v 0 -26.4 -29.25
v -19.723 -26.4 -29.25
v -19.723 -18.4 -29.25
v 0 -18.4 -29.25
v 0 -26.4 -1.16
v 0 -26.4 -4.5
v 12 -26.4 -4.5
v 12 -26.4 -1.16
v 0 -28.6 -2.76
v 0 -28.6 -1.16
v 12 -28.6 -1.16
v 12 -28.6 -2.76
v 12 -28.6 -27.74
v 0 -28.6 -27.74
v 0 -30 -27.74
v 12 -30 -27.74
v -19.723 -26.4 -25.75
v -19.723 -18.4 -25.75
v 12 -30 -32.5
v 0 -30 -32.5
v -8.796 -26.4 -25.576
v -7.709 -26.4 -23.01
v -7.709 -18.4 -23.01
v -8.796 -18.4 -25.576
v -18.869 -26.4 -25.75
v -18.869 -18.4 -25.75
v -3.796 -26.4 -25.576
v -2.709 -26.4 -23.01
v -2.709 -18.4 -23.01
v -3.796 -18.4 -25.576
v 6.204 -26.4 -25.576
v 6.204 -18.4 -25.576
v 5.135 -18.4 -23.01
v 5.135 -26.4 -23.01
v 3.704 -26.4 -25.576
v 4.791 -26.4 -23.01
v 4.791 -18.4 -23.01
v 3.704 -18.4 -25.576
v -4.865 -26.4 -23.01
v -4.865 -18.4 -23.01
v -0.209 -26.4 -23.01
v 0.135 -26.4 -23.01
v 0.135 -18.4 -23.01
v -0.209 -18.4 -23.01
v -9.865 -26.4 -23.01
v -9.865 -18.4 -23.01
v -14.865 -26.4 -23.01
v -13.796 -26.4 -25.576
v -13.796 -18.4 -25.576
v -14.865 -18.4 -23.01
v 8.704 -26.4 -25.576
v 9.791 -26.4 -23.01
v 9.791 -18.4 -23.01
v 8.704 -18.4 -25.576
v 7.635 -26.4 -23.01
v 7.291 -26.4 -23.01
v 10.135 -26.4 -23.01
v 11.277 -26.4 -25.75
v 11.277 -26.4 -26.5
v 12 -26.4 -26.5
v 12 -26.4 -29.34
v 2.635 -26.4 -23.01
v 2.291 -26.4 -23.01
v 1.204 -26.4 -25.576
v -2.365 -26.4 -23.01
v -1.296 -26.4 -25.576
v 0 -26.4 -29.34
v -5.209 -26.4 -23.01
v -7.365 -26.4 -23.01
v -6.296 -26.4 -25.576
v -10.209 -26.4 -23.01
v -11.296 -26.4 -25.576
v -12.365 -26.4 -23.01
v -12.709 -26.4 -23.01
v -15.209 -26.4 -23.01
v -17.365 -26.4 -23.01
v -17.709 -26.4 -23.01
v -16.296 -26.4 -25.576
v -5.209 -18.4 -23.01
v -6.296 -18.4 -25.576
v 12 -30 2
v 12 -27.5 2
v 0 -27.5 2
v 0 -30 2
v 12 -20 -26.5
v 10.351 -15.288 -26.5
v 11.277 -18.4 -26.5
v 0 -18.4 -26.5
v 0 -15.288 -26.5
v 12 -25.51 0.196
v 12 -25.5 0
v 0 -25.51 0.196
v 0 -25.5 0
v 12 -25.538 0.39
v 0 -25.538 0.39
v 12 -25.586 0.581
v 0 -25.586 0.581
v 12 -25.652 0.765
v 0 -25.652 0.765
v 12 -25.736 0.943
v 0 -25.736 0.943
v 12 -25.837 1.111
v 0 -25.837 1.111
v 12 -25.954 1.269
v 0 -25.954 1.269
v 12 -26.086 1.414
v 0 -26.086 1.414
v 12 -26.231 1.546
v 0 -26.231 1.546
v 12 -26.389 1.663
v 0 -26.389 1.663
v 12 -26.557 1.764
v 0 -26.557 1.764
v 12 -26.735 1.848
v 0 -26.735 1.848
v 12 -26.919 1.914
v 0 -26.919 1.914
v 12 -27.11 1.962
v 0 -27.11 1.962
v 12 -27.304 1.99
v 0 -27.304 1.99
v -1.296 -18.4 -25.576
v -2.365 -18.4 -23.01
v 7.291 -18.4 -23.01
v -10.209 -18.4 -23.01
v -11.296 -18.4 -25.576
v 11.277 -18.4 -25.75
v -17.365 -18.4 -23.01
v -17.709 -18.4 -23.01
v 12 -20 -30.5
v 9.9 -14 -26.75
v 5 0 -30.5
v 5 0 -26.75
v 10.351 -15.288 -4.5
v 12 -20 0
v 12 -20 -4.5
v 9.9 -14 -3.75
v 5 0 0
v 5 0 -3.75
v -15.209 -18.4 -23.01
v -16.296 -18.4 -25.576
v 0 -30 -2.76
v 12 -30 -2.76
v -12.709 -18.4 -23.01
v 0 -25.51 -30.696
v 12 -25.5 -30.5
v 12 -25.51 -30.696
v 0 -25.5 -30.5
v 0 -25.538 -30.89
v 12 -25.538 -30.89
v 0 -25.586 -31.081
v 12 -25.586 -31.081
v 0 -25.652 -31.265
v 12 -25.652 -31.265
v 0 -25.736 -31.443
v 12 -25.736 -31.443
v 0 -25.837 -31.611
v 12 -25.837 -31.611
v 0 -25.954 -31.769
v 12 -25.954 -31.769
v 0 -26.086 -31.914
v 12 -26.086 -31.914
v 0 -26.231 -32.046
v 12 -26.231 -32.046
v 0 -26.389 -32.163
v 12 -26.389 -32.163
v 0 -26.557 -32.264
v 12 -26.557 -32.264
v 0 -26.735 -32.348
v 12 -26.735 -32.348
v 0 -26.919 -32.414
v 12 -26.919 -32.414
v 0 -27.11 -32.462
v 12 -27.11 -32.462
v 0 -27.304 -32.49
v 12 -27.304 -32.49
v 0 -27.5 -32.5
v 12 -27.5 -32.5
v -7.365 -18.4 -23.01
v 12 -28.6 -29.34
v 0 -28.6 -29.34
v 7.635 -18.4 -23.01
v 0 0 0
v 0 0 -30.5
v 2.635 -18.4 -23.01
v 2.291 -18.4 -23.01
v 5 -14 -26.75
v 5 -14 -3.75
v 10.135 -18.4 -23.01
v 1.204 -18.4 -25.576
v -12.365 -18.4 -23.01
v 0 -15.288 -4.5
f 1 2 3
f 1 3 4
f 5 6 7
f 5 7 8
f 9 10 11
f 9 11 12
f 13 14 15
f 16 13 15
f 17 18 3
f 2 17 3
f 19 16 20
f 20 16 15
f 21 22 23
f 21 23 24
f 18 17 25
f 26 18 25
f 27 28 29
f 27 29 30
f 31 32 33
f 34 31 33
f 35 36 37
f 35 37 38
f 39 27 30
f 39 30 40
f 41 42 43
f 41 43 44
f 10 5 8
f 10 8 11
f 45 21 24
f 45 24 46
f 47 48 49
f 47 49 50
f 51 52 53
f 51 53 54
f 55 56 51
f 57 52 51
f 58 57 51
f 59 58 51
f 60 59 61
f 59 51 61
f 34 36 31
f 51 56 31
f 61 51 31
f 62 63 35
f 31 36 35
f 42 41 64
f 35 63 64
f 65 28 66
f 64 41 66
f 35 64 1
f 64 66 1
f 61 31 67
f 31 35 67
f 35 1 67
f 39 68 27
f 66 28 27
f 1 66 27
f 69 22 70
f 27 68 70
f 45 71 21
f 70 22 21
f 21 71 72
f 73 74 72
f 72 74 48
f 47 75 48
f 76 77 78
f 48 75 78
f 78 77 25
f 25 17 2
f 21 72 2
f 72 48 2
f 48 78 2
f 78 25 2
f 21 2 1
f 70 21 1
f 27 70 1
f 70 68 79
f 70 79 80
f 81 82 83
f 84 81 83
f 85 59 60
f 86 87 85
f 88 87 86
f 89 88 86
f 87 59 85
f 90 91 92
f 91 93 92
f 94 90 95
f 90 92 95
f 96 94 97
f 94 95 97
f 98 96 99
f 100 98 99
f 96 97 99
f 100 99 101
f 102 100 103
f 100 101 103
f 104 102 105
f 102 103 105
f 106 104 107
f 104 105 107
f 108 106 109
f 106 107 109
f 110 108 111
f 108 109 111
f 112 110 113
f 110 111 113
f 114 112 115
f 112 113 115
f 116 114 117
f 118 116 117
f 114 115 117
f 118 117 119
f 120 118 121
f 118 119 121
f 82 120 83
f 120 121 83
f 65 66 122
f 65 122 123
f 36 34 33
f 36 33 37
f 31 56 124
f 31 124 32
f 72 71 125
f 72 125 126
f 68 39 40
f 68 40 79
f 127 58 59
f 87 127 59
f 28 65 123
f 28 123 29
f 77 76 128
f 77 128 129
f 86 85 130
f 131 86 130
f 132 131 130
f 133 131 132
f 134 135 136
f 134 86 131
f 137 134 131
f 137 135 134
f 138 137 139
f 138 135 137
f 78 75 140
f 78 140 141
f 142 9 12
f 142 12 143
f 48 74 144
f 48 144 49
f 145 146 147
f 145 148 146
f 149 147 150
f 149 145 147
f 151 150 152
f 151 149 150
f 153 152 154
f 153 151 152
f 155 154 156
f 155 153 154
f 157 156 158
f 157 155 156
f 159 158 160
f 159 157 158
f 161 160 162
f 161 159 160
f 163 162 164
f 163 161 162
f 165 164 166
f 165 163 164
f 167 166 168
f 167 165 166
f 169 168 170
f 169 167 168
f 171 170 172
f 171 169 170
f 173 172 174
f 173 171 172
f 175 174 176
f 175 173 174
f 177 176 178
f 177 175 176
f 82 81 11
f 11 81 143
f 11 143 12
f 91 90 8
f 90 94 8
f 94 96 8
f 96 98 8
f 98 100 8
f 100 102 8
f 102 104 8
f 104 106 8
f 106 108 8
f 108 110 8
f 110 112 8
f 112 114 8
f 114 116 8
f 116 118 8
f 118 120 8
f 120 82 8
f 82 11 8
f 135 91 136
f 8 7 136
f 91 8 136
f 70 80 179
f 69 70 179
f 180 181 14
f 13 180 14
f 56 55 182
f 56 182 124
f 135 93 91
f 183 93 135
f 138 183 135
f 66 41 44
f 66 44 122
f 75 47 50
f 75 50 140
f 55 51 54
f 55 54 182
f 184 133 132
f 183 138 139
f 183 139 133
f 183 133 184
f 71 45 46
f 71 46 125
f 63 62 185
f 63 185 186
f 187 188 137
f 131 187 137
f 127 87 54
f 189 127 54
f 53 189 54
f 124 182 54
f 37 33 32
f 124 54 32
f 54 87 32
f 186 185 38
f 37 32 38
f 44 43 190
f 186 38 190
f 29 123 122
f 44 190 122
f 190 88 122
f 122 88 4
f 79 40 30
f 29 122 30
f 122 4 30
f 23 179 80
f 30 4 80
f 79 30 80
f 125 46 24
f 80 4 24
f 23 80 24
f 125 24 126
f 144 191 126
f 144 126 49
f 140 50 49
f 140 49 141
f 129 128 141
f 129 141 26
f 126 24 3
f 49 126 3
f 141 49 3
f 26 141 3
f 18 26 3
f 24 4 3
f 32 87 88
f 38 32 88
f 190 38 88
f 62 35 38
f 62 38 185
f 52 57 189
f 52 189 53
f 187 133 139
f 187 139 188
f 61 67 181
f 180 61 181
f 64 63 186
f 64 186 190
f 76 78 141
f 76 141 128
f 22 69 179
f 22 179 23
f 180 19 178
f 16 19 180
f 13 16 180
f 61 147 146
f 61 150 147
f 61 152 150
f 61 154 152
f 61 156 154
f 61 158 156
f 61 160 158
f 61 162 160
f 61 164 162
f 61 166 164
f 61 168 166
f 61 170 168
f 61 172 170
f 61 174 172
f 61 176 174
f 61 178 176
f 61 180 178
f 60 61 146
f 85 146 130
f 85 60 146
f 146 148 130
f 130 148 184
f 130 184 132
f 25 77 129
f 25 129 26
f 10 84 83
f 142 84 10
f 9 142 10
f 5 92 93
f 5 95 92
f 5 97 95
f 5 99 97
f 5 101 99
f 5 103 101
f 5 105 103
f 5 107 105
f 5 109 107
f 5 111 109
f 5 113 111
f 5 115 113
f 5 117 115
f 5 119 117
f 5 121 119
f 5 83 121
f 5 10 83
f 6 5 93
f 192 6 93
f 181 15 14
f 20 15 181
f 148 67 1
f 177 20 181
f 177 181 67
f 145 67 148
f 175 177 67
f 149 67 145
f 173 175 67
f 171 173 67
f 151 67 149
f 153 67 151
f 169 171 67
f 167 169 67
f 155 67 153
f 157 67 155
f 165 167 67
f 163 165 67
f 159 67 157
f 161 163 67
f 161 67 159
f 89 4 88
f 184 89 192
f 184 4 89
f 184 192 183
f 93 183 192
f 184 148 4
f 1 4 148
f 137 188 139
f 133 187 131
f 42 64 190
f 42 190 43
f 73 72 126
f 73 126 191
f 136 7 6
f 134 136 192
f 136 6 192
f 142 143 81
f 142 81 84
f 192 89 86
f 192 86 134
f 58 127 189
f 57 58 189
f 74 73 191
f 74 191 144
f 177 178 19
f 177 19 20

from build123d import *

# Parameters (mm, degrees)
BOSS_EXTRUDE1_DEPTH = 30.5
SKETCH4_W           = 22
SKETCH4_H           = 15
CUT_EXTRUDE2_DEPTH  = 25
CUT_EXTRUDE4_DEPTH  = 11.5
SKETCH7_W           = 31
SKETCH7_H           = 3.5
BOSS_EXTRUDE3_DEPTH = 8
BOSS_EXTRUDE4_START = -8
BOSS_EXTRUDE4_DEPTH = 8
LPATTERN1_COUNT     = 12
LPATTERN1_PITCH     = 2.5
SKETCH11_W          = 12
SKETCH11_H          = 4.5
BOSS_EXTRUDE5_DEPTH = 2
FILLET1_R           = 2
FILLET2_R           = 2
CUT_EXTRUDE5_DEPTH  = 49.427812959


with BuildPart() as part:
    # Sketch1 → Boss-Extrude1 (new body)
    with BuildSketch(Plane.XY):
        Polygon((0, 0), (0, -30), (12, -30), (12, -20), (5, 0), align=None)
    extrude(amount=-BOSS_EXTRUDE1_DEPTH)

    # Sketch4 → Cut-Extrude2 (cut)
    with BuildSketch(Plane.ZY):
        with Locations((-15.5, -22.788025353)):
            Rectangle(SKETCH4_W, SKETCH4_H)
    extrude(amount=-CUT_EXTRUDE2_DEPTH, mode=Mode.SUBTRACT)

    # Sketch6 → Cut-Extrude4 (cut, symmetric)
    with BuildSketch(Plane.XY.offset(-15.25)):
        Polygon((5, 0), (5, -14), (9.9, -14), align=None)
    extrude(amount=CUT_EXTRUDE4_DEPTH, both=True, mode=Mode.SUBTRACT)

    # Sketch7 → Boss-Extrude3 (add)
    with BuildSketch(Plane(origin=(0, -26.4, 0), x_dir=(1, 0, 0), z_dir=(0, 1, 0))):
        with Locations((-4.2231607, 27.5)):
            Rectangle(SKETCH7_W, SKETCH7_H)
    extrude(amount=BOSS_EXTRUDE3_DEPTH)

    # Sketch10 → Boss-Extrude4 (add)
    with BuildSketch(Plane(origin=(0, -18.4, 0), x_dir=(1, 0, 0), z_dir=(0, 1, 0)).offset(BOSS_EXTRUDE4_START)):
        Polygon((11.2768393, 25.75), (10.134695379, 23.01044295), (9.791251241, 23.01044295), (8.630940097, 25.75), align=None)
    boss_extrude4 = extrude(amount=BOSS_EXTRUDE4_DEPTH)

    # LPattern1: Boss-Extrude4 ×12
    with Locations(*[(-i * LPATTERN1_PITCH, 0, 0) for i in range(1, LPATTERN1_COUNT)]):
        add(boss_extrude4)

    # Sketch11 → Boss-Extrude5 (add)
    with BuildSketch(Plane(origin=(0, 0, -30.5), x_dir=(-1, 0, 0), z_dir=(0, 0, -1))):
        with Locations((-6, -27.75)):
            Rectangle(SKETCH11_W, SKETCH11_H)
    boss_extrude5 = extrude(amount=BOSS_EXTRUDE5_DEPTH)

    # Fillet1
    fillet1_edges = [part.edges().sort_by_distance(p)[0] for p in [
        (6, -25.5, -32.5),
    ]]
    fillet(fillet1_edges, radius=FILLET1_R - 0.0001)  # a hair under: the kernel refuses the full size

    # Mirror1: Boss-Extrude5 across plane
    add(boss_extrude5.mirror(Plane.XY.offset(-15.25)))

    # Fillet2
    fillet2_edges = [part.edges().sort_by_distance(p)[0] for p in [
        (6, -25.5, 2),
    ]]
    fillet(fillet2_edges, radius=FILLET2_R - 0.0001)  # a hair under: the kernel refuses the full size

    # Sketch9 → Cut-Extrude5 (cut, through all)
    with BuildSketch(Plane.ZY):
        Polygon((-6.15967028, -26.4), (-1.15967028, -26.4), (-1.15967028, -28.6), (-2.75967028, -28.6), (-2.75967028, -30.296685761), (-6.15967028, -30.296685761), align=None)
        Polygon((-27.74032972, -30.296685761), (-24.34032972, -30.296685761), (-24.34032972, -26.4), (-29.34032972, -26.4), (-29.34032972, -28.6), (-27.74032972, -28.6), align=None)
    extrude(amount=-CUT_EXTRUDE5_DEPTH, mode=Mode.SUBTRACT)


solid = part.part
